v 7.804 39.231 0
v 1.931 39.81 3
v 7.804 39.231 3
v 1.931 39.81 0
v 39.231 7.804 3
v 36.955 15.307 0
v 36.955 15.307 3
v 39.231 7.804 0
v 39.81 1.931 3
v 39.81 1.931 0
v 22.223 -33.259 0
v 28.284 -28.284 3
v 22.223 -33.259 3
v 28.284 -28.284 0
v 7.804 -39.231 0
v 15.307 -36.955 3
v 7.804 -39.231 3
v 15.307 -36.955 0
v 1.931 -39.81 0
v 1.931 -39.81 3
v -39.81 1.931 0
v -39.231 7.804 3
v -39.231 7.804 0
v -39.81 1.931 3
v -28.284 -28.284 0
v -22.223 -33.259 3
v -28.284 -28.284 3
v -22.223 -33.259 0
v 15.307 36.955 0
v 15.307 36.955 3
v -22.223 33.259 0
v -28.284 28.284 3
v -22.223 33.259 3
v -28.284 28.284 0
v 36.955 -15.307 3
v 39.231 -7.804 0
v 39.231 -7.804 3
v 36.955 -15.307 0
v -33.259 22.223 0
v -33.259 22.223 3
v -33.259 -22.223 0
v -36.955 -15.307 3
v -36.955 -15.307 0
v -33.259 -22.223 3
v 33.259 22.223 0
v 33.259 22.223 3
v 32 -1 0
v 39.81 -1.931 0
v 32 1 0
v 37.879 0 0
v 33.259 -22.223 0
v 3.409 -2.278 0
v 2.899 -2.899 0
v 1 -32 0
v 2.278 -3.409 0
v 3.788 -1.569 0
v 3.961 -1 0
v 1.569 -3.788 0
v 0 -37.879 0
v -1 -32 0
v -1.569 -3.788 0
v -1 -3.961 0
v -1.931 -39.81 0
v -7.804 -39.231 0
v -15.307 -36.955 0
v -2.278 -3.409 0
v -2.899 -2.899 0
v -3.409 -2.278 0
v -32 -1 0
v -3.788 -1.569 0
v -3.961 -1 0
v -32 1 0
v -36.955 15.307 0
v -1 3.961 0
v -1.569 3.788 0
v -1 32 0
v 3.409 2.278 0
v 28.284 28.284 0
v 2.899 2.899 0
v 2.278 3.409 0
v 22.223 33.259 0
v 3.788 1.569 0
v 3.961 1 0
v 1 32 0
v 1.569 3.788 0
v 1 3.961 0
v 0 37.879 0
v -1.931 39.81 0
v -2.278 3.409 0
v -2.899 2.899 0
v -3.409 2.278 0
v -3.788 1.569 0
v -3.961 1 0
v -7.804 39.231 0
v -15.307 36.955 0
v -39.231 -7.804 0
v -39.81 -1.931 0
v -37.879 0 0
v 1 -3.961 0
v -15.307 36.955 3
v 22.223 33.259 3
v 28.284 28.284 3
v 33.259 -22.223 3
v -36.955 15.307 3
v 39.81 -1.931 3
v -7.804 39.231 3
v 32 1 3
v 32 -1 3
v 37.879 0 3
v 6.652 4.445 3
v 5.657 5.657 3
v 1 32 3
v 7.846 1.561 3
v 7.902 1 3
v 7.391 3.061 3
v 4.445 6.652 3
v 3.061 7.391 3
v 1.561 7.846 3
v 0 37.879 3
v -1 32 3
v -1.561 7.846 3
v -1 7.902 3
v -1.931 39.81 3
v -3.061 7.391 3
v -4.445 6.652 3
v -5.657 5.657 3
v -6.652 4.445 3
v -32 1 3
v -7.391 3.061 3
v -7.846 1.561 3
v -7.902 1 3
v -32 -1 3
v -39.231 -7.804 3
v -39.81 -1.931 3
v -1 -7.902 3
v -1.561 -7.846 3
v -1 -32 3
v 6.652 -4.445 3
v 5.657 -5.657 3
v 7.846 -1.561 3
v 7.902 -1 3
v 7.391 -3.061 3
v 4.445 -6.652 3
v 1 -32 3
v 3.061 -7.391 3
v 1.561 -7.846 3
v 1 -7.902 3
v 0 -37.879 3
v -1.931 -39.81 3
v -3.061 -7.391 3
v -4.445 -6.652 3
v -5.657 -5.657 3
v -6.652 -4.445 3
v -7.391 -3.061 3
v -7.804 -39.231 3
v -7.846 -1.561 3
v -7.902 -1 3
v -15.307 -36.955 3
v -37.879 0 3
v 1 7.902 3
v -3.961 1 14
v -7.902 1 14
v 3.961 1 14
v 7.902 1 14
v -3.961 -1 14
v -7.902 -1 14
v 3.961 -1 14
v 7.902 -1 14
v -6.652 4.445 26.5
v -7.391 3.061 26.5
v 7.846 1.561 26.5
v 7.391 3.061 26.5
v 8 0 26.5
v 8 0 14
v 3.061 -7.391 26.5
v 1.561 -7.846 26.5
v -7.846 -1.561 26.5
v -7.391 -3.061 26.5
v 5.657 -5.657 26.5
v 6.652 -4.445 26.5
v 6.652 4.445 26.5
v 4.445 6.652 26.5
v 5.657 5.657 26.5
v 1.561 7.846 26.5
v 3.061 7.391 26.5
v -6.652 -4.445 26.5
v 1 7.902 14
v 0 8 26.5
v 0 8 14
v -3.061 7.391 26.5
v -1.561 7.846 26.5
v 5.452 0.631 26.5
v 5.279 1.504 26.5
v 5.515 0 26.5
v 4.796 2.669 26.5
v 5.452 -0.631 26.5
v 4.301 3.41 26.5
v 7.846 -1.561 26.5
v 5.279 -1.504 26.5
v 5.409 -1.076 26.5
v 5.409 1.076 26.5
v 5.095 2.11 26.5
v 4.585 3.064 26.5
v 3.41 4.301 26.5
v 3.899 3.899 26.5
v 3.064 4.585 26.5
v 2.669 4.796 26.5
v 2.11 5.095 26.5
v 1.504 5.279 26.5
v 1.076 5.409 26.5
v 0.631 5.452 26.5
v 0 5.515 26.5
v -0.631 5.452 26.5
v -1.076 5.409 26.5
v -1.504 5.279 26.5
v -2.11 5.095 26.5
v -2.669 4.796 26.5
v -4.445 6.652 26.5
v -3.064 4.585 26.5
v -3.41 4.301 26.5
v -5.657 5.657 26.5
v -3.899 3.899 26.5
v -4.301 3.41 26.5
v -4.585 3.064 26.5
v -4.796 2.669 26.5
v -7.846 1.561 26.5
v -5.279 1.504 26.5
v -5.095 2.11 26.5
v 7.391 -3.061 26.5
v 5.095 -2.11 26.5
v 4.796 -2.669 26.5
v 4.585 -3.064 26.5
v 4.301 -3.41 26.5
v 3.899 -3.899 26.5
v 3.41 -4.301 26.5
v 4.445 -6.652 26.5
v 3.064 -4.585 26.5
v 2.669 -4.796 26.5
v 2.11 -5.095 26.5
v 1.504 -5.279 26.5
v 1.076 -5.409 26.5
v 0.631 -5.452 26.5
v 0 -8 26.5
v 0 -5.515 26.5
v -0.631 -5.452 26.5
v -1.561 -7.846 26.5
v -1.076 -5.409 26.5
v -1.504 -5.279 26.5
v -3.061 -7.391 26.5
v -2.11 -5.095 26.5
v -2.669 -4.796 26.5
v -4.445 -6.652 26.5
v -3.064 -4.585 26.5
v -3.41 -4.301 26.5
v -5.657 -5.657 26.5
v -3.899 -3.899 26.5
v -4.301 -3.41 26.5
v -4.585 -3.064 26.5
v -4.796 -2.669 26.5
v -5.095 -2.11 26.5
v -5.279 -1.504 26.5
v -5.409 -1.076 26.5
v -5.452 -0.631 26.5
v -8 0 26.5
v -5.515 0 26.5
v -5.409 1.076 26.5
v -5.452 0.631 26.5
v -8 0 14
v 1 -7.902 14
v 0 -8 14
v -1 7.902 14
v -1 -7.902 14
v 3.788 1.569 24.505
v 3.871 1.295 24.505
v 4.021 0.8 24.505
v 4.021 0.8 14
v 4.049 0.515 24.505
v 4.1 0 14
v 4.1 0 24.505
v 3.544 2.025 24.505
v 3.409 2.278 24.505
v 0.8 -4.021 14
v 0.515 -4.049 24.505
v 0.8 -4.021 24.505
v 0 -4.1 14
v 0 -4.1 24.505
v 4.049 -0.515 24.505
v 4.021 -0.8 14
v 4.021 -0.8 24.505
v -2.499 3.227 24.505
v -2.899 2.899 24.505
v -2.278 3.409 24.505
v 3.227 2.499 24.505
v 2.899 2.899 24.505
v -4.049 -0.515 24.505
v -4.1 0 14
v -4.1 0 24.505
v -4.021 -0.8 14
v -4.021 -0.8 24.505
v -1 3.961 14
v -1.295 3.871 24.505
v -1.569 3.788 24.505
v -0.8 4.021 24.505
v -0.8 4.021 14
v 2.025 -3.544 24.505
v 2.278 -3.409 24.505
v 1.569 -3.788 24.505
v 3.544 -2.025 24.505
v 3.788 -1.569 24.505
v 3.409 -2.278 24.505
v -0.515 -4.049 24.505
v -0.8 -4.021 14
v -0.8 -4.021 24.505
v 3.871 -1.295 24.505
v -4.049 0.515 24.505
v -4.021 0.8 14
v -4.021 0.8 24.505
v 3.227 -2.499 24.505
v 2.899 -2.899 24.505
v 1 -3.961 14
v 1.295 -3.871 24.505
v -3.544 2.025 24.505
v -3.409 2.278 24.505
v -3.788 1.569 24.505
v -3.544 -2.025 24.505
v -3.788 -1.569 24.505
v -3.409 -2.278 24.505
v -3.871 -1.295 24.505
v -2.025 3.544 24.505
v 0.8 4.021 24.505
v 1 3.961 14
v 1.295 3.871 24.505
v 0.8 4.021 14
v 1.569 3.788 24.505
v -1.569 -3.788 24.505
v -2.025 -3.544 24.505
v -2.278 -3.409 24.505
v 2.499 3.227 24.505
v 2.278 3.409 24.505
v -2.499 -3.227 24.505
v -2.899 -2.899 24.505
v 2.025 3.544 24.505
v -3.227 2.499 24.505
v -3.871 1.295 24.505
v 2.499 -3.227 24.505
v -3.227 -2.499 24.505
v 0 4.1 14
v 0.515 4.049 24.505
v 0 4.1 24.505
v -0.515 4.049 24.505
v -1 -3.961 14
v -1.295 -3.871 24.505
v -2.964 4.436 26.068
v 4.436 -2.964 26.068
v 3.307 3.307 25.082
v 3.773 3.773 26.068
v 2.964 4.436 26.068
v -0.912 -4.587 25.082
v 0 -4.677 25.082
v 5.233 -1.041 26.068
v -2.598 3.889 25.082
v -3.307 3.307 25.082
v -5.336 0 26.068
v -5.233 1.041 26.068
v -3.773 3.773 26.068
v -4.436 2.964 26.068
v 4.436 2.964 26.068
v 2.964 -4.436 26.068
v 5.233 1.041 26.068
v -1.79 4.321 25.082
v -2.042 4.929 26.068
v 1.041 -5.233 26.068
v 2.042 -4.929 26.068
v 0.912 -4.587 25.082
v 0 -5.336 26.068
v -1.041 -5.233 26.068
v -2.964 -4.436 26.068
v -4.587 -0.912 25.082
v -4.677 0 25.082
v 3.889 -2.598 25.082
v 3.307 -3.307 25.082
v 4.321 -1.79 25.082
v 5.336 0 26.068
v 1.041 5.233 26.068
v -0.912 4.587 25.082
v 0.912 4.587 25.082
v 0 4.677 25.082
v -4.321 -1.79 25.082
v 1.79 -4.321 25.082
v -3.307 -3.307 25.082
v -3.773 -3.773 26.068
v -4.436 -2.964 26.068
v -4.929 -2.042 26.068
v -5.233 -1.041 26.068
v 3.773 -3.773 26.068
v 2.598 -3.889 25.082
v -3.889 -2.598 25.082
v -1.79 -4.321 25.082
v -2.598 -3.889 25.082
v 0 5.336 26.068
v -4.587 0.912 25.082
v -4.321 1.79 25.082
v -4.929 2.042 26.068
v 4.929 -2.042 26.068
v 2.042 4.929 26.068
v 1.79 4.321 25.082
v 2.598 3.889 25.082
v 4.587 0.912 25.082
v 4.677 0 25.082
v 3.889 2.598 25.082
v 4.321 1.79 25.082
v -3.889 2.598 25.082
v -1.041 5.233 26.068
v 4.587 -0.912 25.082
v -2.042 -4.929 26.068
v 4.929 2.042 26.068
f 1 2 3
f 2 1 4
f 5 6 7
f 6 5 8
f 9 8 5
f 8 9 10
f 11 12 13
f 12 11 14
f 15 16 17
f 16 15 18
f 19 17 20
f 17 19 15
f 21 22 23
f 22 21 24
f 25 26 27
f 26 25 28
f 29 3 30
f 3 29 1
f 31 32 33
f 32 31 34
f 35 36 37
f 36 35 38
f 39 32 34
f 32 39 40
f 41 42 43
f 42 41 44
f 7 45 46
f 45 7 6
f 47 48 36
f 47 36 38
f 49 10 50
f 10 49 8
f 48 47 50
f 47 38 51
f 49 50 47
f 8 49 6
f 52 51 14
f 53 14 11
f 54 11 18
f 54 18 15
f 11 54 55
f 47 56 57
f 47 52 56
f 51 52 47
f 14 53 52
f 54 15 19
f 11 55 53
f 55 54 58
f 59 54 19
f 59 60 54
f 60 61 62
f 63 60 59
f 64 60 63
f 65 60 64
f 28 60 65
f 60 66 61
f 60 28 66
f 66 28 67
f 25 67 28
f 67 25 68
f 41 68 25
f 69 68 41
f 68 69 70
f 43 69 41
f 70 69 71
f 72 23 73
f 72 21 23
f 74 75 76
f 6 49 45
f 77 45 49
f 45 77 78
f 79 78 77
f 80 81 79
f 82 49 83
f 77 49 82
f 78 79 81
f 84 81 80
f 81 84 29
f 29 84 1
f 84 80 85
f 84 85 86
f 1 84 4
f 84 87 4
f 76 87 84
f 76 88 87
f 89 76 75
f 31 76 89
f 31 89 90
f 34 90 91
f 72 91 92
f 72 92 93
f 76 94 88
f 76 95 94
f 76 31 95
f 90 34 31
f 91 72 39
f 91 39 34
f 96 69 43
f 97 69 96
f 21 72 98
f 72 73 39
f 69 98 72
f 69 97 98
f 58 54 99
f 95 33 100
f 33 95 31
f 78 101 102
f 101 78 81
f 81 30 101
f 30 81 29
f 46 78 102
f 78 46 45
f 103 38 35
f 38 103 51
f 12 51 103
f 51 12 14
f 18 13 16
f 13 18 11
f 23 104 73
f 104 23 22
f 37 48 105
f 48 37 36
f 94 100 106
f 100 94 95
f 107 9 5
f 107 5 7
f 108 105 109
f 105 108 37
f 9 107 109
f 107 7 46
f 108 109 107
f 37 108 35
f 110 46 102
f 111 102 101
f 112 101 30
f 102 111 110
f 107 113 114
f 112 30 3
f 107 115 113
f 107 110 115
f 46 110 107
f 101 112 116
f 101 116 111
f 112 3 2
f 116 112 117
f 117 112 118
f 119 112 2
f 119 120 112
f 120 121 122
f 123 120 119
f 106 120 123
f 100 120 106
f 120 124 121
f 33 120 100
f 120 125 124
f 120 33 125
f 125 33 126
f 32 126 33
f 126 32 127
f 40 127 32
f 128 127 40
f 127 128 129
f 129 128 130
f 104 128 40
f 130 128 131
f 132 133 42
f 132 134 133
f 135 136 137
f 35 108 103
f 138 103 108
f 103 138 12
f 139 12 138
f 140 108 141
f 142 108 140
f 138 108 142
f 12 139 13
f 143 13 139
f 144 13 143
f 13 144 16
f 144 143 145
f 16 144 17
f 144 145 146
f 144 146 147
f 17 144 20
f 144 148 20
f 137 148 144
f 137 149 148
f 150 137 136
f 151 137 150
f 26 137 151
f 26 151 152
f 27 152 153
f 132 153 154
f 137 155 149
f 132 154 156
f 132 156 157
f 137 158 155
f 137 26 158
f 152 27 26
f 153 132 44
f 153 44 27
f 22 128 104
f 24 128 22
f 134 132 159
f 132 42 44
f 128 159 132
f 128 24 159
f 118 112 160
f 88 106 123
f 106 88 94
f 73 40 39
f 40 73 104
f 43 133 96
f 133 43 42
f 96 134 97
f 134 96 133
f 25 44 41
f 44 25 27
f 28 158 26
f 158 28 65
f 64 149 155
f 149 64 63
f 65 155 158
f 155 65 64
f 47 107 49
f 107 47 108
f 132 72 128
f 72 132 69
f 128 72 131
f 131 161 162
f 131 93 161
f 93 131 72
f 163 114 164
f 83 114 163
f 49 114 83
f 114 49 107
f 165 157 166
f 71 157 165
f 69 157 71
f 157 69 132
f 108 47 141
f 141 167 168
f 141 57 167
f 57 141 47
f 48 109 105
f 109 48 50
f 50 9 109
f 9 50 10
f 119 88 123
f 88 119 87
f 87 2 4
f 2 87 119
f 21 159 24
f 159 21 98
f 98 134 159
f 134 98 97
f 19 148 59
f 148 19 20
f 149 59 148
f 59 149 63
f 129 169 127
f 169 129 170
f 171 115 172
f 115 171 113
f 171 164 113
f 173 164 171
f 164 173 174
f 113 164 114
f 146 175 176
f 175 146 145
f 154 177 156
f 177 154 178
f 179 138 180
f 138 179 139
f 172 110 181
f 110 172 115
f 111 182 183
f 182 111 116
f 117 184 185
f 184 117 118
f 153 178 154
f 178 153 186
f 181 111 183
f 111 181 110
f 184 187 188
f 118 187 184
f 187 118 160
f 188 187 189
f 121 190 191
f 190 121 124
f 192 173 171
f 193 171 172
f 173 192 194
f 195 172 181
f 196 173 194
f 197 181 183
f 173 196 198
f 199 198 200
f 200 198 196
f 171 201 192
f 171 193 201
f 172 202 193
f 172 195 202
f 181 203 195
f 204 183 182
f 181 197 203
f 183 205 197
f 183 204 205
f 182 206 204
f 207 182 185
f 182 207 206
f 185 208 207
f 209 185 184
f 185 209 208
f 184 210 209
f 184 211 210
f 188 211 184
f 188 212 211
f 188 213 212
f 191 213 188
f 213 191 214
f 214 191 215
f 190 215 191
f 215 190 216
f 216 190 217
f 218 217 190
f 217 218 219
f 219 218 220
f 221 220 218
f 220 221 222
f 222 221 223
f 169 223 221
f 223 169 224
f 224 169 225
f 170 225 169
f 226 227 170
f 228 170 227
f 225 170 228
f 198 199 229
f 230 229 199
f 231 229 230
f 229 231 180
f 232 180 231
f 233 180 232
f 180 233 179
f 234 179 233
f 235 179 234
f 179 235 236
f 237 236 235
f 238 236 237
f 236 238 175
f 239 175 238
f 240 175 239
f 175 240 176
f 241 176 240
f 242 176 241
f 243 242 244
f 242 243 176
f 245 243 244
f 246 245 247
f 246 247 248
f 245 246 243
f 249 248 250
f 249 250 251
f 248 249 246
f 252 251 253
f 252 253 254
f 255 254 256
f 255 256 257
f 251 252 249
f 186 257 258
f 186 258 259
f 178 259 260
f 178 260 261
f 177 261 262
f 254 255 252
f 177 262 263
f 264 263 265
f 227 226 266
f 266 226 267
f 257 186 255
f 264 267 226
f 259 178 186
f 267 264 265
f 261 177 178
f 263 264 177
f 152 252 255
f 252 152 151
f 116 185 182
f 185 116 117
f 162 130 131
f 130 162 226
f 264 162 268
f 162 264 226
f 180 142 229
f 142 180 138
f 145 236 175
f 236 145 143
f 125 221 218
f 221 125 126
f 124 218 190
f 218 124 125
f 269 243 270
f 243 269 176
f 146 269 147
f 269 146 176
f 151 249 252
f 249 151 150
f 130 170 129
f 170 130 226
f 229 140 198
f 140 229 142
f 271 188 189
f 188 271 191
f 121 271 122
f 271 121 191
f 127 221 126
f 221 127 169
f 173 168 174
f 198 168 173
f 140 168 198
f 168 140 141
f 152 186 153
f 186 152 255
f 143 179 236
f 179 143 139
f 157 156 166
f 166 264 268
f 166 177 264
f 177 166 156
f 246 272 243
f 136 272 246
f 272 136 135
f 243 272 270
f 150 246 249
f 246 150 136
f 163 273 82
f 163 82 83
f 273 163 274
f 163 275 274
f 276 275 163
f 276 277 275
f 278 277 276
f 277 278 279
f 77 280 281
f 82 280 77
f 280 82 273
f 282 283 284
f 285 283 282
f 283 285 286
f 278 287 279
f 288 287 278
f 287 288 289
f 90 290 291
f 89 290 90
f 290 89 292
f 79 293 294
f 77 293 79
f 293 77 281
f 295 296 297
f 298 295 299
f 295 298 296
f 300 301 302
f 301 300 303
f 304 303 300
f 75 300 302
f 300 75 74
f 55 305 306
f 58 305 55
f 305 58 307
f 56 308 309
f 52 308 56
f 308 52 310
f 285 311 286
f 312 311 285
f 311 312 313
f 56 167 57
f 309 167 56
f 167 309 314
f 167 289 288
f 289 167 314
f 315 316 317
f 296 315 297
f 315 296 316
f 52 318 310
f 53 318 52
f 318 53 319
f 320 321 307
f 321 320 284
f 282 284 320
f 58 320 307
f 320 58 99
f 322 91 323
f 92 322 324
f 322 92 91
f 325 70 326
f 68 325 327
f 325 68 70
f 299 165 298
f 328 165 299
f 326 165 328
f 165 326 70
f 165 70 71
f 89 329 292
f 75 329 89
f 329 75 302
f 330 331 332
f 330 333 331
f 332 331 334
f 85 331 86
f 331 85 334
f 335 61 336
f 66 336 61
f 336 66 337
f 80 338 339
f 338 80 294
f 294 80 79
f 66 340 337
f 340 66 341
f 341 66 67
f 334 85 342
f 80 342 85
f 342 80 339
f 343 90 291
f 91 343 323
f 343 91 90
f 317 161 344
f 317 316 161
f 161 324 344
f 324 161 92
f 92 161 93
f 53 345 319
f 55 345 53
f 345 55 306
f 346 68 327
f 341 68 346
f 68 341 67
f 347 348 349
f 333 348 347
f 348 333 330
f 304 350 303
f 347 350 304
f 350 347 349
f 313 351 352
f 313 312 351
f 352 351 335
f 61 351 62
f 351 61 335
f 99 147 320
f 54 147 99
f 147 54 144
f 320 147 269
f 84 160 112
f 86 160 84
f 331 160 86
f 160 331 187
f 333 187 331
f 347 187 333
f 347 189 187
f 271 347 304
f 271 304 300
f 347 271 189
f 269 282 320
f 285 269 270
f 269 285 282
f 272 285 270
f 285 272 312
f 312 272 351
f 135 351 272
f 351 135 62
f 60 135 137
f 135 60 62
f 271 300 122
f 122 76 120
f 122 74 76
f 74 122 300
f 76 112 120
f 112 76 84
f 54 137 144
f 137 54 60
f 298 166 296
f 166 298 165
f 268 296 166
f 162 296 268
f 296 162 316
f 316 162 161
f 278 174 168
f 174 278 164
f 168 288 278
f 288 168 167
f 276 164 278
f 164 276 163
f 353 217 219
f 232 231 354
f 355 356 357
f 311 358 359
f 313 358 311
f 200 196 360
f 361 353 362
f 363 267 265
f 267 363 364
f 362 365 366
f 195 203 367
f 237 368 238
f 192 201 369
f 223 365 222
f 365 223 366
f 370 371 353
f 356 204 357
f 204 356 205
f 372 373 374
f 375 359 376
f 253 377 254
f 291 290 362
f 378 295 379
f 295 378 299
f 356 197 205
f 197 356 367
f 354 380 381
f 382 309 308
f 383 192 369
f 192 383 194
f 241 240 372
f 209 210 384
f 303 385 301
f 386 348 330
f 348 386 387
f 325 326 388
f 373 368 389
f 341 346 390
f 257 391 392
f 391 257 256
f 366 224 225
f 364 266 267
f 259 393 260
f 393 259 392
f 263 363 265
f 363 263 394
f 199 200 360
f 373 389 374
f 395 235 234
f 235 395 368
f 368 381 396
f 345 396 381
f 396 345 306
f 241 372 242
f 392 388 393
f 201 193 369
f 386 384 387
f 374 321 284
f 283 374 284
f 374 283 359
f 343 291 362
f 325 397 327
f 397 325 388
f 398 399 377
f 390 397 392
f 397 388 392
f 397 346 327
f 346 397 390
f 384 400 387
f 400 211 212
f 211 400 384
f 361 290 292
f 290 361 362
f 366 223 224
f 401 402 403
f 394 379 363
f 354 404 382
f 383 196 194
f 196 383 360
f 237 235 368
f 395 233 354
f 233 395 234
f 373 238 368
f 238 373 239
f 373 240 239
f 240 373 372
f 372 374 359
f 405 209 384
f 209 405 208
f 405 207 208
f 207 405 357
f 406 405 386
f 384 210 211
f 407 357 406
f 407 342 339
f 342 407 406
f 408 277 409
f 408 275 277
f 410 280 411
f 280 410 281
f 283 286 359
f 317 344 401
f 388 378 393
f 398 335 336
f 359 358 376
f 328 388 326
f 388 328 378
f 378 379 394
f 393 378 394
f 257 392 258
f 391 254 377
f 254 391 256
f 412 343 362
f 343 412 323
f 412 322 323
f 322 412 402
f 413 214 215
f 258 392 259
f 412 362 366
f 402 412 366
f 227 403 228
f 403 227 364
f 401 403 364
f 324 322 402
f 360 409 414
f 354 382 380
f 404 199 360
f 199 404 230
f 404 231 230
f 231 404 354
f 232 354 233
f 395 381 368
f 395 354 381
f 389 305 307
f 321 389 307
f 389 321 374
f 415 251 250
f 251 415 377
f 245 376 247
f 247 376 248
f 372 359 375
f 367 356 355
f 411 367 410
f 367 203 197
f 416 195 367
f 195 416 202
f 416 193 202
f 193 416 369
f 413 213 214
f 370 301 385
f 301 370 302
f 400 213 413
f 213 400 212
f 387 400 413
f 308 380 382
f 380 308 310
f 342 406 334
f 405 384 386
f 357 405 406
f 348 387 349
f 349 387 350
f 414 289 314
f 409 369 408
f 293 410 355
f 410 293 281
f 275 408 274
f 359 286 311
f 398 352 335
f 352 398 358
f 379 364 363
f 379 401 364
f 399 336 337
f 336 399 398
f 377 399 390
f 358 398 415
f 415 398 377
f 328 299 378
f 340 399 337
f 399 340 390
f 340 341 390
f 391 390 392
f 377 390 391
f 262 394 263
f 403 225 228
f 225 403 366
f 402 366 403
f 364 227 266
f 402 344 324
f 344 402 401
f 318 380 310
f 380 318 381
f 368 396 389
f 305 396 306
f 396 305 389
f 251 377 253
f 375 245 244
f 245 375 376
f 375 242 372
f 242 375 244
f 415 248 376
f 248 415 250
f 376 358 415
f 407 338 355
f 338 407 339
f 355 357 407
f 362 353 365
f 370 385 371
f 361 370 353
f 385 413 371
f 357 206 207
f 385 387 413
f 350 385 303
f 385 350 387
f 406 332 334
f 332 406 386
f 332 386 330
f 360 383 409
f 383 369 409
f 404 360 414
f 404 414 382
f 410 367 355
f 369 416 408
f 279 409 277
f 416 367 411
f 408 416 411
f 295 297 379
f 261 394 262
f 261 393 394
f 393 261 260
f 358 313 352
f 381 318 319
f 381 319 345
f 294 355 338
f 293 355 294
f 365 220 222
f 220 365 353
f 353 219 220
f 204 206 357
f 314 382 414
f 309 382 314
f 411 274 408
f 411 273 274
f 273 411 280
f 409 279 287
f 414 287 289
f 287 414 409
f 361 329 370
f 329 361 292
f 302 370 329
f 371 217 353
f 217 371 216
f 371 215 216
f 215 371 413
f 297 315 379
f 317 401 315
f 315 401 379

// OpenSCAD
//By Coat, 08-jul-2018
//Licensed under the Creative Commons - Attribution license.
//Drillguide for straight/perpendicular holes for use on flat board or for edges board

//Primary parameters
//diameter drill (mm), add a little tolerance
drilldiam = 8.2;
//height of the  guidetube (mm)
guideheight = 25;
//width of the guidetube (mm)
guidewidth = 16;
//thickness of the baseplate (mm)
platethick = 3;
//width of the baseplate (mm)
platewidth = 80;
//baseplate square (1) or round (0)
squareYN = 0;
//number of "wings" to wrap around the board, 0 = none, 1 = 1 and 2 is 2
numberwings = 0;
//when using 1 or 2 wings for end side board, give the thickness of the board (mm, add a little tolerance for 2 wings)
boardwidth = 18.1;

//The Parts
//****************************************
//Untouched baseplate
module squareround(w,t)
{
  difference()
  {
  if(squareYN)     
    cube([w, w, t], center=true);
  else
    cylinder(d=w,h=t, center=true); 
  cube([w/1.25, guidlinew, guideheight],center = true);
  
  translate([0.5*platewidth,0,0])
    nodge();
  translate([0,0.5*platewidth,0])
    nodge();
  translate([-0.5*platewidth,0,0])
    nodge();
  translate([0,-0.5*platewidth,0])
    nodge();
  }
} 

//****************************************
//Break up baseplate in pieces -> the "wings"
module piece()
{
      rotate([0,90,0])
        intersection()
        {
          squareround(platewidth,platethick);
          translate([0.5*(platewidth+boardwidth), 0, 0]) 
            cube([platewidth, platewidth, platethick*2], center = true);
        }  
}  

//****************************************
//Baseplate with or without "wings"
module plate()
{
  if (numberwings==0)                   //no wings 
    squareround(platewidth,platethick); //untouched baseplate
  if(numberwings==1)                    //1 wings
  {  
    difference()                        //cut off one part of baseplate
    {
      squareround(platewidth,platethick);
      translate([0.5*(platewidth+boardwidth), 0, 0]) 
        cube([platewidth, platewidth*2, platethick*2], center = true);
    }  

    translate([0.5*boardwidth+0.5*platethick, 0, 0.5*boardwidth+0.5*platethick])
      piece();                          //and add that piece again under 90 degrees
  }
  if(numberwings==2)                    //2 wings
  {  
    difference()                        //cut off two parts of baseplate
    {
      squareround(platewidth,platethick);
      translate([0.5*(platewidth+boardwidth), 0, 0]) 
        cube([platewidth, platewidth*2, platethick*2], center = true);
      translate([-0.5*(platewidth+boardwidth), 0, 0]) 
        cube([platewidth, platewidth*2, platethick*2], center = true);
    }  
    //and add the pieces again under 90 degrees
    translate([0.5*boardwidth+0.5*platethick, 0, 0.5*boardwidth+0.5*platethick])
      piece();                      
    translate([-0.5*boardwidth-0.5*platethick, 0, 0.5*boardwidth+0.5*platethick])
      piece();          
  }
}  

//****************************************
//Guidenodges
module nodge()
{
  rotate([0,0,45])
    cube([3,3,3*platethick], center=true);
}

//****************************************
//Main
  //secondary parameters
  $fn = 32;
  guidlinew = min(2,drilldiam/2);
  dtop = (guidewidth + drilldiam)/2;

  //The thing
  translate([0,0,0.5 * platethick])
  difference()
  {
    union()                    //Solid drillguide and baseplate
    {
      cylinder(d = guidewidth, h = guideheight);
      plate();
    }  
    cylinder(d = drilldiam , h = guideheight*3, center = true);   //drillhole
    //sawdust-channel / guidelines over the length
    cube([guidlinew, platewidth/1.25, guideheight], center = true); 
    //sawdust-channel in drillguide (rest in module squareround)
    cube([guidewidth, guidlinew, guideheight],center = true);
    //edge in top drillguide to make it easier to insert drill
    translate([0,0,guideheight + dtop/5])
      sphere(d= dtop);
}
